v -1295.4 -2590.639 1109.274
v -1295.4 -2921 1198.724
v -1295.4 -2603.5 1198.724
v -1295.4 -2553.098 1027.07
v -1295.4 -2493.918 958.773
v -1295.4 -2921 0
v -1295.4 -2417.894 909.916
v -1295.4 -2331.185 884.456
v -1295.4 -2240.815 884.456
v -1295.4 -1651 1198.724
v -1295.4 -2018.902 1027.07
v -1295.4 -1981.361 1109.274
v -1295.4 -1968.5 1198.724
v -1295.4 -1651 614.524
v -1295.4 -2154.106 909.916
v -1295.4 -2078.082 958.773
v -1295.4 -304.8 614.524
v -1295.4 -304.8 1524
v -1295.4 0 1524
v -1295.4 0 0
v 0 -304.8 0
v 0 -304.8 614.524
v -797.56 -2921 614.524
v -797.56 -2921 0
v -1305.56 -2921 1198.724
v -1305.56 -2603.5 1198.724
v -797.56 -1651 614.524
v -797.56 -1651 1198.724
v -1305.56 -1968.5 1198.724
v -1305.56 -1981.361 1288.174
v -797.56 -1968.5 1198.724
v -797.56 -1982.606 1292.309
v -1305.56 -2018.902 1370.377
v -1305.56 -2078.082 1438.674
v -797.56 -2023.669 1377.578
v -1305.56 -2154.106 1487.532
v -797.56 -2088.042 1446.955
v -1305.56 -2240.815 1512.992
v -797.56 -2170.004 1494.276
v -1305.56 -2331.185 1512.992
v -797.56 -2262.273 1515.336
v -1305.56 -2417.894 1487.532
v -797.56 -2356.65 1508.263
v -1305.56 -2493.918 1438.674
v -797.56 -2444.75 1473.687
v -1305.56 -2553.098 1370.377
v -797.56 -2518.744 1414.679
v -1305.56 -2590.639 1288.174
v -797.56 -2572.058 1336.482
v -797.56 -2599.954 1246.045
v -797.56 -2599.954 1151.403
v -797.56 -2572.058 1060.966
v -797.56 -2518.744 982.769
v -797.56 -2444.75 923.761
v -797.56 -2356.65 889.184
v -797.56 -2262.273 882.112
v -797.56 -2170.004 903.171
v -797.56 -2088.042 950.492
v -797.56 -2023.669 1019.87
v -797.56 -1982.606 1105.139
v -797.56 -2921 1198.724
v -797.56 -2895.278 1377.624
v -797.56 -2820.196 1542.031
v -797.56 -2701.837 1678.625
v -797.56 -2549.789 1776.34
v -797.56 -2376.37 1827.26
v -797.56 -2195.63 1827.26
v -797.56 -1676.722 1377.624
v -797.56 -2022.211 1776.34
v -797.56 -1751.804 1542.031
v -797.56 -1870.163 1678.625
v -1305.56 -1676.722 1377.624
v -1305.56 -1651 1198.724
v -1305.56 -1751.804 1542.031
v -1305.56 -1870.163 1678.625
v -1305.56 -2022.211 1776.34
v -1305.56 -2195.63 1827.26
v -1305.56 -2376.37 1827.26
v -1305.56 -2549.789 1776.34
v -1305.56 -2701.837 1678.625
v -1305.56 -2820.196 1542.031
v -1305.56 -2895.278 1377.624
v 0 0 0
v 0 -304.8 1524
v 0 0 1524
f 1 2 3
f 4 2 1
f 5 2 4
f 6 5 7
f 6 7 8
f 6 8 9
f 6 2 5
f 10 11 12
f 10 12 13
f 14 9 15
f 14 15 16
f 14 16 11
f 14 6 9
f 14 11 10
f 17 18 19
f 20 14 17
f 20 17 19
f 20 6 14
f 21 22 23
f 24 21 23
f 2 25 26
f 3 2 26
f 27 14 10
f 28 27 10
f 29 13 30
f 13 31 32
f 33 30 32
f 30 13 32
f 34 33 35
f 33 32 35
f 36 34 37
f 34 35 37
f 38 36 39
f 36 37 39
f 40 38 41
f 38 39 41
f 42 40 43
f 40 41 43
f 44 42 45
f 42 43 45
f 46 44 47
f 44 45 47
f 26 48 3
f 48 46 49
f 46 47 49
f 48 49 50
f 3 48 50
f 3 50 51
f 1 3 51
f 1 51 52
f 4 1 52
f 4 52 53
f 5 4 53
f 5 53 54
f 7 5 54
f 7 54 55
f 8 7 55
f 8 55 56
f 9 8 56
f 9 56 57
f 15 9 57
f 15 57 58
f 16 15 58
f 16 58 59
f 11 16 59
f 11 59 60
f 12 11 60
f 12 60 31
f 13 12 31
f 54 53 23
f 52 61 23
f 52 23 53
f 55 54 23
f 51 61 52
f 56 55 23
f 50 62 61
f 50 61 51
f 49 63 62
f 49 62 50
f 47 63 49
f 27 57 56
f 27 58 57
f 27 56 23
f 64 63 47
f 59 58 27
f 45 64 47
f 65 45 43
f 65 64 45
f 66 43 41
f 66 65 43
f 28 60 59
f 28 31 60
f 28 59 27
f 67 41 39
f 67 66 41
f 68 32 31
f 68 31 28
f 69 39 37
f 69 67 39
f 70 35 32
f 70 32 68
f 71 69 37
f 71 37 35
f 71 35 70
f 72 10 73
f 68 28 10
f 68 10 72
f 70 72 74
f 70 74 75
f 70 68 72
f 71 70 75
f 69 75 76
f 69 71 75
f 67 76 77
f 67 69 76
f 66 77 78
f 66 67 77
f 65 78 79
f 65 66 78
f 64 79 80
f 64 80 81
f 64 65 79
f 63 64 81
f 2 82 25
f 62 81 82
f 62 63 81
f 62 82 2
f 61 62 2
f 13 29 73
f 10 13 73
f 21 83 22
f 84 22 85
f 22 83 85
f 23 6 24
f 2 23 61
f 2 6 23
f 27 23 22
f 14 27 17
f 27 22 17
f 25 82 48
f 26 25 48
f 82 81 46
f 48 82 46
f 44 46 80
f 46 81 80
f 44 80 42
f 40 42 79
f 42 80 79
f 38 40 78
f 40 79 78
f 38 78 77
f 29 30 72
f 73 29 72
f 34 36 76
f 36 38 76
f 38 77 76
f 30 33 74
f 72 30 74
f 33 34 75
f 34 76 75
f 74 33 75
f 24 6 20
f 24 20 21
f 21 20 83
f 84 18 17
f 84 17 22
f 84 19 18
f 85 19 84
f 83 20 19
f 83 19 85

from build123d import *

# Parameters (mm, degrees)
F0_W      = 1524
F0_H      = 1524
F1_DEPTH  = 304.8
F3_DEPTH  = 2616.2
F4_W      = 508
F4_H      = 1270
F5_DEPTH  = 584.2
F6_DEPTH  = 218.44
F8_DEPTH  = 508
F9_R      = 317.5
F10_DEPTH = 508
F11_DEPTH = 228.6
F13_DEPTH = 1165.86


with BuildPart() as f1:
    # F0 (on Front) → F1 (new body)
    with BuildSketch(Plane.XZ):
        with Locations((-762, 762)):
            Rectangle(F0_W, F0_H)
    extrude(amount=F1_DEPTH)

    # F2 (on face) → F3 (join)
    with BuildSketch(Plane.XZ.offset(304.8)):
        Polygon((-1524, 614.5238280296), (-1524, 0), (-66.4134323597, 0), (0, 0), (0, 614.5238280296), (-66.4134323597, 614.5238280296), align=None)
    extrude(amount=F3_DEPTH)

    # F4 (on face) → F5 (join)
    with BuildSketch(Plane.XY.offset(614.5238280296)):
        with Locations((-1270, -2286)):
            Rectangle(F4_W, F4_H)
    extrude(amount=F5_DEPTH)

    # F6 (add): a face of the model
    f6_faces = [f1.faces().sort_by_distance(p)[0] for p in [
        (-1016, -2286, 906.6238280296),
    ]]
    extrude(f6_faces, amount=F6_DEPTH)

    # F7 (on face) → F8 (join)
    with BuildSketch(Plane.YZ.offset(-797.56)):
        with BuildLine():
            Line((-2921, 1198.7238280296), (-1651, 1198.7238280296))
            ThreePointArc((-1651, 1198.7238280296), (-2286, 1833.7238280296), (-2921, 1198.7238280296))
        make_face()
    extrude(amount=-F8_DEPTH)

    # F9 (on face) → F10 (cut)
    with BuildSketch(Plane.YZ.offset(-797.56)):
        with Locations((-2286, 1198.7238280296)):
            Circle(F9_R)
    extrude(amount=-F10_DEPTH, mode=Mode.SUBTRACT)

    # F11 (cut): a face of the model
    f11_faces = [f1.faces().sort_by_distance(p)[0] for p in [
        (-1524, -1549.2830540632, 540.3397185849),
    ]]
    extrude(f11_faces, amount=-F11_DEPTH, mode=Mode.SUBTRACT)

    # F12 (on face) → F13 (cut)
    with BuildSketch(Plane.XY.offset(614.5238280296)):
        Polygon((0, -304.8), (-797.56, -2921), (0, -2921), align=None)
    extrude(amount=-F13_DEPTH, mode=Mode.SUBTRACT)


solid = f1.part
